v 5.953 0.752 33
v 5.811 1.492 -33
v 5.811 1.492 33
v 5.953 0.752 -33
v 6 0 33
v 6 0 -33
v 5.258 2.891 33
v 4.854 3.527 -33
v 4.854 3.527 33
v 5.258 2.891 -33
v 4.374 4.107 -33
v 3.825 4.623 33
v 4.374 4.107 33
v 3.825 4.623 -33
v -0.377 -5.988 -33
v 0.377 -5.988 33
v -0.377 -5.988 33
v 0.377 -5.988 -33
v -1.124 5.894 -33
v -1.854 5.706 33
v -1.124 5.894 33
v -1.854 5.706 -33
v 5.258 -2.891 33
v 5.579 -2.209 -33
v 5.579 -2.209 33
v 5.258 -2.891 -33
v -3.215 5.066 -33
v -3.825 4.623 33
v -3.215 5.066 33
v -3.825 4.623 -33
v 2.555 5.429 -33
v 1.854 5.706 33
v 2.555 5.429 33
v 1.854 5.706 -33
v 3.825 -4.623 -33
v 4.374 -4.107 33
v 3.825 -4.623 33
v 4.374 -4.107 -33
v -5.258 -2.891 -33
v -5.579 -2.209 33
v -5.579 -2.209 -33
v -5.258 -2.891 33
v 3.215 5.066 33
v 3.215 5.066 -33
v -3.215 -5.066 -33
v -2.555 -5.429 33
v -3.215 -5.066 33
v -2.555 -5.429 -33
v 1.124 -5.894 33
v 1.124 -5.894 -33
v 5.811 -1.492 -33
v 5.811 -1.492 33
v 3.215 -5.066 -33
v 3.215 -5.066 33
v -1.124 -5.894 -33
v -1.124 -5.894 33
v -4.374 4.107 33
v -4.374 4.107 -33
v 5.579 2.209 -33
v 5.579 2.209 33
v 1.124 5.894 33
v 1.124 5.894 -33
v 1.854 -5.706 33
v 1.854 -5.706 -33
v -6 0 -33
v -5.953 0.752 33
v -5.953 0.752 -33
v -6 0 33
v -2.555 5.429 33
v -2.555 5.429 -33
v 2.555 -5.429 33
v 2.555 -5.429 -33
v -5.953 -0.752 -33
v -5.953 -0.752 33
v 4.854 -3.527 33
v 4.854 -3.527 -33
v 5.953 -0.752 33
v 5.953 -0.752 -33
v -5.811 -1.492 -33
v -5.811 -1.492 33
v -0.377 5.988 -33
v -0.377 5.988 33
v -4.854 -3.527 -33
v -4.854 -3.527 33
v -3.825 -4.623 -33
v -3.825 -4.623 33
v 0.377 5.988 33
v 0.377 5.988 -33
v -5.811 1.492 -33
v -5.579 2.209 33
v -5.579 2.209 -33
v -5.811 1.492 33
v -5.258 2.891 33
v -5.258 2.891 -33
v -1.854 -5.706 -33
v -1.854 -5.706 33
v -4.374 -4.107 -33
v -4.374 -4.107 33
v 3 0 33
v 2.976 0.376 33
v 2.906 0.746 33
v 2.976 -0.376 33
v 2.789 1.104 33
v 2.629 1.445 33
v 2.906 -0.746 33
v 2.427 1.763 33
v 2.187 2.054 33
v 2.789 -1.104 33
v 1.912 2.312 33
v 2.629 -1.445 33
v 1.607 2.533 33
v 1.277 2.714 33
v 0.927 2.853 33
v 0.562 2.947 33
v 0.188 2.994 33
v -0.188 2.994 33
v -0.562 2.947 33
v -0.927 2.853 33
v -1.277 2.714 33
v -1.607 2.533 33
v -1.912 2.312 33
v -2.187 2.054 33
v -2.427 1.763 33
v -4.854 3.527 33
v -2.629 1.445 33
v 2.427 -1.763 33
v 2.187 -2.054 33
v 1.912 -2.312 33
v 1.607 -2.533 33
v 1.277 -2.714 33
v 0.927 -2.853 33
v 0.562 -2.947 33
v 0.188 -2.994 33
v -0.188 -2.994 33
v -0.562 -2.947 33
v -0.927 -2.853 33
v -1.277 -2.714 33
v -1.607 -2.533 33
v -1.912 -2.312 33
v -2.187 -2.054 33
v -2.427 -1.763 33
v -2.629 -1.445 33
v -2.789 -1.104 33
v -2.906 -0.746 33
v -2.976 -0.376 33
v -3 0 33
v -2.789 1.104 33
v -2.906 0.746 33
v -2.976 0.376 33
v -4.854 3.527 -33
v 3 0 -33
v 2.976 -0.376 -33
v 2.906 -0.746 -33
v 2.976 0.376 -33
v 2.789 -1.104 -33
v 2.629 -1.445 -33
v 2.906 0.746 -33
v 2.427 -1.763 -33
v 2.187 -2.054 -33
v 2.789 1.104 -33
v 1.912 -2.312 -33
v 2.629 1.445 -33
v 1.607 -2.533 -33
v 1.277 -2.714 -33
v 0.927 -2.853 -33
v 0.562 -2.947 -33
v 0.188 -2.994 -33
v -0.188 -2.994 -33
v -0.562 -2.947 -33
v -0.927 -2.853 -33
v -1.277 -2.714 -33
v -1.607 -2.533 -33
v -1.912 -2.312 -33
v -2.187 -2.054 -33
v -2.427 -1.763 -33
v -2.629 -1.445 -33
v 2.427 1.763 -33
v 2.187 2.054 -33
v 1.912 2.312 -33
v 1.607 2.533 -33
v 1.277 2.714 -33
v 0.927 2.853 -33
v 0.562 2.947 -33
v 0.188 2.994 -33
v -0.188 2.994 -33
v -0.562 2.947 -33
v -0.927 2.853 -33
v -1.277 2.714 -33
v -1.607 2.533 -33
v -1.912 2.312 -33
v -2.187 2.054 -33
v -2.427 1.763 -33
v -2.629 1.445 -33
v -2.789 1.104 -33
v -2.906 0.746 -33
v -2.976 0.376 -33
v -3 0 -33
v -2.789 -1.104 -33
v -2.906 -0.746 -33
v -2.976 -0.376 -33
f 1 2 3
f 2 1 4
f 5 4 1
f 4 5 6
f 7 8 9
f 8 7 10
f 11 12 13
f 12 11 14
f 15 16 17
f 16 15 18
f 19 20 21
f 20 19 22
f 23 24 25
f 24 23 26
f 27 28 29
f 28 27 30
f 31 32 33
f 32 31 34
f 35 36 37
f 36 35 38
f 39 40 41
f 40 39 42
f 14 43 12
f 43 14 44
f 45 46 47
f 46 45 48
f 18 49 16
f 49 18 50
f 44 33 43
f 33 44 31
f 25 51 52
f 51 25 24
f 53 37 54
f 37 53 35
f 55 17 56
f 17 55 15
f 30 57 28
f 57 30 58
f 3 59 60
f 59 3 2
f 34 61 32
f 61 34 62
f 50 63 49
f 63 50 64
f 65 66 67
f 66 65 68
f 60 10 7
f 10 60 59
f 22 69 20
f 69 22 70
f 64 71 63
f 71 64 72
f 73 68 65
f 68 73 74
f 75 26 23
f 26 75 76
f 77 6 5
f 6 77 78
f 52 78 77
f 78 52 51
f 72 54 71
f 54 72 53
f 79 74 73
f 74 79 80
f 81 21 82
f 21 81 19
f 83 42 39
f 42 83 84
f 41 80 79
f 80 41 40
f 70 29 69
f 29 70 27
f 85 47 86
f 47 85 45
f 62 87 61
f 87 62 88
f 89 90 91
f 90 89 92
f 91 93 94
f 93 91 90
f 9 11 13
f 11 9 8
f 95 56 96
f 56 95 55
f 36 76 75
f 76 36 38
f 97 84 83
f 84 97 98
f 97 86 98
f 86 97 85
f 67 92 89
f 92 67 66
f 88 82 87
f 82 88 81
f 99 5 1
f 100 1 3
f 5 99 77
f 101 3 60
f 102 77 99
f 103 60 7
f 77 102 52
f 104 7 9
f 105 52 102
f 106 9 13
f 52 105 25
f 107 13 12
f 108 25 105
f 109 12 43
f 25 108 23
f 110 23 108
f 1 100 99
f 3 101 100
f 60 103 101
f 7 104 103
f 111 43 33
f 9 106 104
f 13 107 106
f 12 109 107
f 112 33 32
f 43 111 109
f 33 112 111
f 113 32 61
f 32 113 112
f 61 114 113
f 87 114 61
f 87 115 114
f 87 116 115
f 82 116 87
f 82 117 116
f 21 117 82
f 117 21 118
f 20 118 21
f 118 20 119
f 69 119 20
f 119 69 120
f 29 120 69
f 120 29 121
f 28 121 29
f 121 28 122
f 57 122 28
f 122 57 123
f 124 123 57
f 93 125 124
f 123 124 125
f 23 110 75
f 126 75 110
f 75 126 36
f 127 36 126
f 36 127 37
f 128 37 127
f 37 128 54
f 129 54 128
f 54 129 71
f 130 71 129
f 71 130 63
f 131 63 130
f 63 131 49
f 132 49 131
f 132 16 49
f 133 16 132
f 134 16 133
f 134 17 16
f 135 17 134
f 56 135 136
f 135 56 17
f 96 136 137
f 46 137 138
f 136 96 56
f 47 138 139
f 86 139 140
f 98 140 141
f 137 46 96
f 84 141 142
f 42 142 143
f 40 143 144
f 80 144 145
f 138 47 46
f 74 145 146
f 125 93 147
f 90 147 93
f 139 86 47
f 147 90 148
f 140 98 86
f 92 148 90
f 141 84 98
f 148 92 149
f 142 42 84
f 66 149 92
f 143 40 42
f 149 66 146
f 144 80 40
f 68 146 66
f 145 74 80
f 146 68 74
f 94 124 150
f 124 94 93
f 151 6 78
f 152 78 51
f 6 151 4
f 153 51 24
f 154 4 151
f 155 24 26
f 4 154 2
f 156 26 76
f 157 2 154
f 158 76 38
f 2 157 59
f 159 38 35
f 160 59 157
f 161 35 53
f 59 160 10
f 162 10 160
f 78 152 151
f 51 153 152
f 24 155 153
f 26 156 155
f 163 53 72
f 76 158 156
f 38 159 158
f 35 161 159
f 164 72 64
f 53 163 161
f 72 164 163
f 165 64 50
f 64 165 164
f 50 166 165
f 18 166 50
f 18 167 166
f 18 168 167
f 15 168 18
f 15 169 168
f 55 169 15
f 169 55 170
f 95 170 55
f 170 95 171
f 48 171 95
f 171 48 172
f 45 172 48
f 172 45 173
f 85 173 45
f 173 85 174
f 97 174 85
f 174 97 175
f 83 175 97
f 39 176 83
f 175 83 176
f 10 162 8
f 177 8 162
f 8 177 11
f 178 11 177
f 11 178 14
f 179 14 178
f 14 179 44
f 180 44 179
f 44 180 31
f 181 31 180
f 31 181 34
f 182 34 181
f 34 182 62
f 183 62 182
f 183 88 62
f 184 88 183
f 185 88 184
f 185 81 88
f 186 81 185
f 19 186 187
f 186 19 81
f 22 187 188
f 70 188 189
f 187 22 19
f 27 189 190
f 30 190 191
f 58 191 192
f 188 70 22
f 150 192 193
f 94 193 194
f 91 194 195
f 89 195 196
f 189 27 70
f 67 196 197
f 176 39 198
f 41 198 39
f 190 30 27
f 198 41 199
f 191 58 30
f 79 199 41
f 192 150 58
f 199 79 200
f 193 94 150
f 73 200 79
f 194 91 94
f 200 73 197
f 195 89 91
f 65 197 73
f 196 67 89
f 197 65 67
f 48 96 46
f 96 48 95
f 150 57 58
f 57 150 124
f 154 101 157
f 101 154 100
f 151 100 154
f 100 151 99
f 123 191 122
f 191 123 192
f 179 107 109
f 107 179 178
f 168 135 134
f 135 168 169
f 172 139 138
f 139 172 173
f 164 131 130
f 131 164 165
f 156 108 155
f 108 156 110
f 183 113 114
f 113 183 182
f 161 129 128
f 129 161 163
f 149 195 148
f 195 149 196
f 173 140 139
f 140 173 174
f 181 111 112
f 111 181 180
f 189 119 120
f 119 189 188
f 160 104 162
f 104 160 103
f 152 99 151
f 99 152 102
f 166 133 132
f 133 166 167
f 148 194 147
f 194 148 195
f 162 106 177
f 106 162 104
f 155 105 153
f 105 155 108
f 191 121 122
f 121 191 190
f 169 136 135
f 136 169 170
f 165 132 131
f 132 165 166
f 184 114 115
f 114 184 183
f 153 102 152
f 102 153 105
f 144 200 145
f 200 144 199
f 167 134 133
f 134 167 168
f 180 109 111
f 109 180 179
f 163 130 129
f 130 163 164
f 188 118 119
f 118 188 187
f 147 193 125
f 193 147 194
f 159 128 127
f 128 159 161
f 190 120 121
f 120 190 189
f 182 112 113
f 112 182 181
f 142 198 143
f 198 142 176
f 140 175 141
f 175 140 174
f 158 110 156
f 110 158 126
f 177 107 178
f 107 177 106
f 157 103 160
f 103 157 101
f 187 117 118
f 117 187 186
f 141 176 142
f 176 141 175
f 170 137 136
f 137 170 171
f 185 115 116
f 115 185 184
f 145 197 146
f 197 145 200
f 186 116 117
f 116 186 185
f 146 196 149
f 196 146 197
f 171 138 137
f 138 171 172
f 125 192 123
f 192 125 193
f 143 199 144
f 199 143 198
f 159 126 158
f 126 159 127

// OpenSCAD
$fn = 50;


difference() {
	union() {
		translate(v = [0, 0, -33.0000000000]) {
			cylinder(h = 66, r = 6.0000000000);
		}
	}
	union() {
		translate(v = [0, 0, -100.0000000000]) {
			cylinder(h = 200, r = 3.0000000000);
		}
	}
}
